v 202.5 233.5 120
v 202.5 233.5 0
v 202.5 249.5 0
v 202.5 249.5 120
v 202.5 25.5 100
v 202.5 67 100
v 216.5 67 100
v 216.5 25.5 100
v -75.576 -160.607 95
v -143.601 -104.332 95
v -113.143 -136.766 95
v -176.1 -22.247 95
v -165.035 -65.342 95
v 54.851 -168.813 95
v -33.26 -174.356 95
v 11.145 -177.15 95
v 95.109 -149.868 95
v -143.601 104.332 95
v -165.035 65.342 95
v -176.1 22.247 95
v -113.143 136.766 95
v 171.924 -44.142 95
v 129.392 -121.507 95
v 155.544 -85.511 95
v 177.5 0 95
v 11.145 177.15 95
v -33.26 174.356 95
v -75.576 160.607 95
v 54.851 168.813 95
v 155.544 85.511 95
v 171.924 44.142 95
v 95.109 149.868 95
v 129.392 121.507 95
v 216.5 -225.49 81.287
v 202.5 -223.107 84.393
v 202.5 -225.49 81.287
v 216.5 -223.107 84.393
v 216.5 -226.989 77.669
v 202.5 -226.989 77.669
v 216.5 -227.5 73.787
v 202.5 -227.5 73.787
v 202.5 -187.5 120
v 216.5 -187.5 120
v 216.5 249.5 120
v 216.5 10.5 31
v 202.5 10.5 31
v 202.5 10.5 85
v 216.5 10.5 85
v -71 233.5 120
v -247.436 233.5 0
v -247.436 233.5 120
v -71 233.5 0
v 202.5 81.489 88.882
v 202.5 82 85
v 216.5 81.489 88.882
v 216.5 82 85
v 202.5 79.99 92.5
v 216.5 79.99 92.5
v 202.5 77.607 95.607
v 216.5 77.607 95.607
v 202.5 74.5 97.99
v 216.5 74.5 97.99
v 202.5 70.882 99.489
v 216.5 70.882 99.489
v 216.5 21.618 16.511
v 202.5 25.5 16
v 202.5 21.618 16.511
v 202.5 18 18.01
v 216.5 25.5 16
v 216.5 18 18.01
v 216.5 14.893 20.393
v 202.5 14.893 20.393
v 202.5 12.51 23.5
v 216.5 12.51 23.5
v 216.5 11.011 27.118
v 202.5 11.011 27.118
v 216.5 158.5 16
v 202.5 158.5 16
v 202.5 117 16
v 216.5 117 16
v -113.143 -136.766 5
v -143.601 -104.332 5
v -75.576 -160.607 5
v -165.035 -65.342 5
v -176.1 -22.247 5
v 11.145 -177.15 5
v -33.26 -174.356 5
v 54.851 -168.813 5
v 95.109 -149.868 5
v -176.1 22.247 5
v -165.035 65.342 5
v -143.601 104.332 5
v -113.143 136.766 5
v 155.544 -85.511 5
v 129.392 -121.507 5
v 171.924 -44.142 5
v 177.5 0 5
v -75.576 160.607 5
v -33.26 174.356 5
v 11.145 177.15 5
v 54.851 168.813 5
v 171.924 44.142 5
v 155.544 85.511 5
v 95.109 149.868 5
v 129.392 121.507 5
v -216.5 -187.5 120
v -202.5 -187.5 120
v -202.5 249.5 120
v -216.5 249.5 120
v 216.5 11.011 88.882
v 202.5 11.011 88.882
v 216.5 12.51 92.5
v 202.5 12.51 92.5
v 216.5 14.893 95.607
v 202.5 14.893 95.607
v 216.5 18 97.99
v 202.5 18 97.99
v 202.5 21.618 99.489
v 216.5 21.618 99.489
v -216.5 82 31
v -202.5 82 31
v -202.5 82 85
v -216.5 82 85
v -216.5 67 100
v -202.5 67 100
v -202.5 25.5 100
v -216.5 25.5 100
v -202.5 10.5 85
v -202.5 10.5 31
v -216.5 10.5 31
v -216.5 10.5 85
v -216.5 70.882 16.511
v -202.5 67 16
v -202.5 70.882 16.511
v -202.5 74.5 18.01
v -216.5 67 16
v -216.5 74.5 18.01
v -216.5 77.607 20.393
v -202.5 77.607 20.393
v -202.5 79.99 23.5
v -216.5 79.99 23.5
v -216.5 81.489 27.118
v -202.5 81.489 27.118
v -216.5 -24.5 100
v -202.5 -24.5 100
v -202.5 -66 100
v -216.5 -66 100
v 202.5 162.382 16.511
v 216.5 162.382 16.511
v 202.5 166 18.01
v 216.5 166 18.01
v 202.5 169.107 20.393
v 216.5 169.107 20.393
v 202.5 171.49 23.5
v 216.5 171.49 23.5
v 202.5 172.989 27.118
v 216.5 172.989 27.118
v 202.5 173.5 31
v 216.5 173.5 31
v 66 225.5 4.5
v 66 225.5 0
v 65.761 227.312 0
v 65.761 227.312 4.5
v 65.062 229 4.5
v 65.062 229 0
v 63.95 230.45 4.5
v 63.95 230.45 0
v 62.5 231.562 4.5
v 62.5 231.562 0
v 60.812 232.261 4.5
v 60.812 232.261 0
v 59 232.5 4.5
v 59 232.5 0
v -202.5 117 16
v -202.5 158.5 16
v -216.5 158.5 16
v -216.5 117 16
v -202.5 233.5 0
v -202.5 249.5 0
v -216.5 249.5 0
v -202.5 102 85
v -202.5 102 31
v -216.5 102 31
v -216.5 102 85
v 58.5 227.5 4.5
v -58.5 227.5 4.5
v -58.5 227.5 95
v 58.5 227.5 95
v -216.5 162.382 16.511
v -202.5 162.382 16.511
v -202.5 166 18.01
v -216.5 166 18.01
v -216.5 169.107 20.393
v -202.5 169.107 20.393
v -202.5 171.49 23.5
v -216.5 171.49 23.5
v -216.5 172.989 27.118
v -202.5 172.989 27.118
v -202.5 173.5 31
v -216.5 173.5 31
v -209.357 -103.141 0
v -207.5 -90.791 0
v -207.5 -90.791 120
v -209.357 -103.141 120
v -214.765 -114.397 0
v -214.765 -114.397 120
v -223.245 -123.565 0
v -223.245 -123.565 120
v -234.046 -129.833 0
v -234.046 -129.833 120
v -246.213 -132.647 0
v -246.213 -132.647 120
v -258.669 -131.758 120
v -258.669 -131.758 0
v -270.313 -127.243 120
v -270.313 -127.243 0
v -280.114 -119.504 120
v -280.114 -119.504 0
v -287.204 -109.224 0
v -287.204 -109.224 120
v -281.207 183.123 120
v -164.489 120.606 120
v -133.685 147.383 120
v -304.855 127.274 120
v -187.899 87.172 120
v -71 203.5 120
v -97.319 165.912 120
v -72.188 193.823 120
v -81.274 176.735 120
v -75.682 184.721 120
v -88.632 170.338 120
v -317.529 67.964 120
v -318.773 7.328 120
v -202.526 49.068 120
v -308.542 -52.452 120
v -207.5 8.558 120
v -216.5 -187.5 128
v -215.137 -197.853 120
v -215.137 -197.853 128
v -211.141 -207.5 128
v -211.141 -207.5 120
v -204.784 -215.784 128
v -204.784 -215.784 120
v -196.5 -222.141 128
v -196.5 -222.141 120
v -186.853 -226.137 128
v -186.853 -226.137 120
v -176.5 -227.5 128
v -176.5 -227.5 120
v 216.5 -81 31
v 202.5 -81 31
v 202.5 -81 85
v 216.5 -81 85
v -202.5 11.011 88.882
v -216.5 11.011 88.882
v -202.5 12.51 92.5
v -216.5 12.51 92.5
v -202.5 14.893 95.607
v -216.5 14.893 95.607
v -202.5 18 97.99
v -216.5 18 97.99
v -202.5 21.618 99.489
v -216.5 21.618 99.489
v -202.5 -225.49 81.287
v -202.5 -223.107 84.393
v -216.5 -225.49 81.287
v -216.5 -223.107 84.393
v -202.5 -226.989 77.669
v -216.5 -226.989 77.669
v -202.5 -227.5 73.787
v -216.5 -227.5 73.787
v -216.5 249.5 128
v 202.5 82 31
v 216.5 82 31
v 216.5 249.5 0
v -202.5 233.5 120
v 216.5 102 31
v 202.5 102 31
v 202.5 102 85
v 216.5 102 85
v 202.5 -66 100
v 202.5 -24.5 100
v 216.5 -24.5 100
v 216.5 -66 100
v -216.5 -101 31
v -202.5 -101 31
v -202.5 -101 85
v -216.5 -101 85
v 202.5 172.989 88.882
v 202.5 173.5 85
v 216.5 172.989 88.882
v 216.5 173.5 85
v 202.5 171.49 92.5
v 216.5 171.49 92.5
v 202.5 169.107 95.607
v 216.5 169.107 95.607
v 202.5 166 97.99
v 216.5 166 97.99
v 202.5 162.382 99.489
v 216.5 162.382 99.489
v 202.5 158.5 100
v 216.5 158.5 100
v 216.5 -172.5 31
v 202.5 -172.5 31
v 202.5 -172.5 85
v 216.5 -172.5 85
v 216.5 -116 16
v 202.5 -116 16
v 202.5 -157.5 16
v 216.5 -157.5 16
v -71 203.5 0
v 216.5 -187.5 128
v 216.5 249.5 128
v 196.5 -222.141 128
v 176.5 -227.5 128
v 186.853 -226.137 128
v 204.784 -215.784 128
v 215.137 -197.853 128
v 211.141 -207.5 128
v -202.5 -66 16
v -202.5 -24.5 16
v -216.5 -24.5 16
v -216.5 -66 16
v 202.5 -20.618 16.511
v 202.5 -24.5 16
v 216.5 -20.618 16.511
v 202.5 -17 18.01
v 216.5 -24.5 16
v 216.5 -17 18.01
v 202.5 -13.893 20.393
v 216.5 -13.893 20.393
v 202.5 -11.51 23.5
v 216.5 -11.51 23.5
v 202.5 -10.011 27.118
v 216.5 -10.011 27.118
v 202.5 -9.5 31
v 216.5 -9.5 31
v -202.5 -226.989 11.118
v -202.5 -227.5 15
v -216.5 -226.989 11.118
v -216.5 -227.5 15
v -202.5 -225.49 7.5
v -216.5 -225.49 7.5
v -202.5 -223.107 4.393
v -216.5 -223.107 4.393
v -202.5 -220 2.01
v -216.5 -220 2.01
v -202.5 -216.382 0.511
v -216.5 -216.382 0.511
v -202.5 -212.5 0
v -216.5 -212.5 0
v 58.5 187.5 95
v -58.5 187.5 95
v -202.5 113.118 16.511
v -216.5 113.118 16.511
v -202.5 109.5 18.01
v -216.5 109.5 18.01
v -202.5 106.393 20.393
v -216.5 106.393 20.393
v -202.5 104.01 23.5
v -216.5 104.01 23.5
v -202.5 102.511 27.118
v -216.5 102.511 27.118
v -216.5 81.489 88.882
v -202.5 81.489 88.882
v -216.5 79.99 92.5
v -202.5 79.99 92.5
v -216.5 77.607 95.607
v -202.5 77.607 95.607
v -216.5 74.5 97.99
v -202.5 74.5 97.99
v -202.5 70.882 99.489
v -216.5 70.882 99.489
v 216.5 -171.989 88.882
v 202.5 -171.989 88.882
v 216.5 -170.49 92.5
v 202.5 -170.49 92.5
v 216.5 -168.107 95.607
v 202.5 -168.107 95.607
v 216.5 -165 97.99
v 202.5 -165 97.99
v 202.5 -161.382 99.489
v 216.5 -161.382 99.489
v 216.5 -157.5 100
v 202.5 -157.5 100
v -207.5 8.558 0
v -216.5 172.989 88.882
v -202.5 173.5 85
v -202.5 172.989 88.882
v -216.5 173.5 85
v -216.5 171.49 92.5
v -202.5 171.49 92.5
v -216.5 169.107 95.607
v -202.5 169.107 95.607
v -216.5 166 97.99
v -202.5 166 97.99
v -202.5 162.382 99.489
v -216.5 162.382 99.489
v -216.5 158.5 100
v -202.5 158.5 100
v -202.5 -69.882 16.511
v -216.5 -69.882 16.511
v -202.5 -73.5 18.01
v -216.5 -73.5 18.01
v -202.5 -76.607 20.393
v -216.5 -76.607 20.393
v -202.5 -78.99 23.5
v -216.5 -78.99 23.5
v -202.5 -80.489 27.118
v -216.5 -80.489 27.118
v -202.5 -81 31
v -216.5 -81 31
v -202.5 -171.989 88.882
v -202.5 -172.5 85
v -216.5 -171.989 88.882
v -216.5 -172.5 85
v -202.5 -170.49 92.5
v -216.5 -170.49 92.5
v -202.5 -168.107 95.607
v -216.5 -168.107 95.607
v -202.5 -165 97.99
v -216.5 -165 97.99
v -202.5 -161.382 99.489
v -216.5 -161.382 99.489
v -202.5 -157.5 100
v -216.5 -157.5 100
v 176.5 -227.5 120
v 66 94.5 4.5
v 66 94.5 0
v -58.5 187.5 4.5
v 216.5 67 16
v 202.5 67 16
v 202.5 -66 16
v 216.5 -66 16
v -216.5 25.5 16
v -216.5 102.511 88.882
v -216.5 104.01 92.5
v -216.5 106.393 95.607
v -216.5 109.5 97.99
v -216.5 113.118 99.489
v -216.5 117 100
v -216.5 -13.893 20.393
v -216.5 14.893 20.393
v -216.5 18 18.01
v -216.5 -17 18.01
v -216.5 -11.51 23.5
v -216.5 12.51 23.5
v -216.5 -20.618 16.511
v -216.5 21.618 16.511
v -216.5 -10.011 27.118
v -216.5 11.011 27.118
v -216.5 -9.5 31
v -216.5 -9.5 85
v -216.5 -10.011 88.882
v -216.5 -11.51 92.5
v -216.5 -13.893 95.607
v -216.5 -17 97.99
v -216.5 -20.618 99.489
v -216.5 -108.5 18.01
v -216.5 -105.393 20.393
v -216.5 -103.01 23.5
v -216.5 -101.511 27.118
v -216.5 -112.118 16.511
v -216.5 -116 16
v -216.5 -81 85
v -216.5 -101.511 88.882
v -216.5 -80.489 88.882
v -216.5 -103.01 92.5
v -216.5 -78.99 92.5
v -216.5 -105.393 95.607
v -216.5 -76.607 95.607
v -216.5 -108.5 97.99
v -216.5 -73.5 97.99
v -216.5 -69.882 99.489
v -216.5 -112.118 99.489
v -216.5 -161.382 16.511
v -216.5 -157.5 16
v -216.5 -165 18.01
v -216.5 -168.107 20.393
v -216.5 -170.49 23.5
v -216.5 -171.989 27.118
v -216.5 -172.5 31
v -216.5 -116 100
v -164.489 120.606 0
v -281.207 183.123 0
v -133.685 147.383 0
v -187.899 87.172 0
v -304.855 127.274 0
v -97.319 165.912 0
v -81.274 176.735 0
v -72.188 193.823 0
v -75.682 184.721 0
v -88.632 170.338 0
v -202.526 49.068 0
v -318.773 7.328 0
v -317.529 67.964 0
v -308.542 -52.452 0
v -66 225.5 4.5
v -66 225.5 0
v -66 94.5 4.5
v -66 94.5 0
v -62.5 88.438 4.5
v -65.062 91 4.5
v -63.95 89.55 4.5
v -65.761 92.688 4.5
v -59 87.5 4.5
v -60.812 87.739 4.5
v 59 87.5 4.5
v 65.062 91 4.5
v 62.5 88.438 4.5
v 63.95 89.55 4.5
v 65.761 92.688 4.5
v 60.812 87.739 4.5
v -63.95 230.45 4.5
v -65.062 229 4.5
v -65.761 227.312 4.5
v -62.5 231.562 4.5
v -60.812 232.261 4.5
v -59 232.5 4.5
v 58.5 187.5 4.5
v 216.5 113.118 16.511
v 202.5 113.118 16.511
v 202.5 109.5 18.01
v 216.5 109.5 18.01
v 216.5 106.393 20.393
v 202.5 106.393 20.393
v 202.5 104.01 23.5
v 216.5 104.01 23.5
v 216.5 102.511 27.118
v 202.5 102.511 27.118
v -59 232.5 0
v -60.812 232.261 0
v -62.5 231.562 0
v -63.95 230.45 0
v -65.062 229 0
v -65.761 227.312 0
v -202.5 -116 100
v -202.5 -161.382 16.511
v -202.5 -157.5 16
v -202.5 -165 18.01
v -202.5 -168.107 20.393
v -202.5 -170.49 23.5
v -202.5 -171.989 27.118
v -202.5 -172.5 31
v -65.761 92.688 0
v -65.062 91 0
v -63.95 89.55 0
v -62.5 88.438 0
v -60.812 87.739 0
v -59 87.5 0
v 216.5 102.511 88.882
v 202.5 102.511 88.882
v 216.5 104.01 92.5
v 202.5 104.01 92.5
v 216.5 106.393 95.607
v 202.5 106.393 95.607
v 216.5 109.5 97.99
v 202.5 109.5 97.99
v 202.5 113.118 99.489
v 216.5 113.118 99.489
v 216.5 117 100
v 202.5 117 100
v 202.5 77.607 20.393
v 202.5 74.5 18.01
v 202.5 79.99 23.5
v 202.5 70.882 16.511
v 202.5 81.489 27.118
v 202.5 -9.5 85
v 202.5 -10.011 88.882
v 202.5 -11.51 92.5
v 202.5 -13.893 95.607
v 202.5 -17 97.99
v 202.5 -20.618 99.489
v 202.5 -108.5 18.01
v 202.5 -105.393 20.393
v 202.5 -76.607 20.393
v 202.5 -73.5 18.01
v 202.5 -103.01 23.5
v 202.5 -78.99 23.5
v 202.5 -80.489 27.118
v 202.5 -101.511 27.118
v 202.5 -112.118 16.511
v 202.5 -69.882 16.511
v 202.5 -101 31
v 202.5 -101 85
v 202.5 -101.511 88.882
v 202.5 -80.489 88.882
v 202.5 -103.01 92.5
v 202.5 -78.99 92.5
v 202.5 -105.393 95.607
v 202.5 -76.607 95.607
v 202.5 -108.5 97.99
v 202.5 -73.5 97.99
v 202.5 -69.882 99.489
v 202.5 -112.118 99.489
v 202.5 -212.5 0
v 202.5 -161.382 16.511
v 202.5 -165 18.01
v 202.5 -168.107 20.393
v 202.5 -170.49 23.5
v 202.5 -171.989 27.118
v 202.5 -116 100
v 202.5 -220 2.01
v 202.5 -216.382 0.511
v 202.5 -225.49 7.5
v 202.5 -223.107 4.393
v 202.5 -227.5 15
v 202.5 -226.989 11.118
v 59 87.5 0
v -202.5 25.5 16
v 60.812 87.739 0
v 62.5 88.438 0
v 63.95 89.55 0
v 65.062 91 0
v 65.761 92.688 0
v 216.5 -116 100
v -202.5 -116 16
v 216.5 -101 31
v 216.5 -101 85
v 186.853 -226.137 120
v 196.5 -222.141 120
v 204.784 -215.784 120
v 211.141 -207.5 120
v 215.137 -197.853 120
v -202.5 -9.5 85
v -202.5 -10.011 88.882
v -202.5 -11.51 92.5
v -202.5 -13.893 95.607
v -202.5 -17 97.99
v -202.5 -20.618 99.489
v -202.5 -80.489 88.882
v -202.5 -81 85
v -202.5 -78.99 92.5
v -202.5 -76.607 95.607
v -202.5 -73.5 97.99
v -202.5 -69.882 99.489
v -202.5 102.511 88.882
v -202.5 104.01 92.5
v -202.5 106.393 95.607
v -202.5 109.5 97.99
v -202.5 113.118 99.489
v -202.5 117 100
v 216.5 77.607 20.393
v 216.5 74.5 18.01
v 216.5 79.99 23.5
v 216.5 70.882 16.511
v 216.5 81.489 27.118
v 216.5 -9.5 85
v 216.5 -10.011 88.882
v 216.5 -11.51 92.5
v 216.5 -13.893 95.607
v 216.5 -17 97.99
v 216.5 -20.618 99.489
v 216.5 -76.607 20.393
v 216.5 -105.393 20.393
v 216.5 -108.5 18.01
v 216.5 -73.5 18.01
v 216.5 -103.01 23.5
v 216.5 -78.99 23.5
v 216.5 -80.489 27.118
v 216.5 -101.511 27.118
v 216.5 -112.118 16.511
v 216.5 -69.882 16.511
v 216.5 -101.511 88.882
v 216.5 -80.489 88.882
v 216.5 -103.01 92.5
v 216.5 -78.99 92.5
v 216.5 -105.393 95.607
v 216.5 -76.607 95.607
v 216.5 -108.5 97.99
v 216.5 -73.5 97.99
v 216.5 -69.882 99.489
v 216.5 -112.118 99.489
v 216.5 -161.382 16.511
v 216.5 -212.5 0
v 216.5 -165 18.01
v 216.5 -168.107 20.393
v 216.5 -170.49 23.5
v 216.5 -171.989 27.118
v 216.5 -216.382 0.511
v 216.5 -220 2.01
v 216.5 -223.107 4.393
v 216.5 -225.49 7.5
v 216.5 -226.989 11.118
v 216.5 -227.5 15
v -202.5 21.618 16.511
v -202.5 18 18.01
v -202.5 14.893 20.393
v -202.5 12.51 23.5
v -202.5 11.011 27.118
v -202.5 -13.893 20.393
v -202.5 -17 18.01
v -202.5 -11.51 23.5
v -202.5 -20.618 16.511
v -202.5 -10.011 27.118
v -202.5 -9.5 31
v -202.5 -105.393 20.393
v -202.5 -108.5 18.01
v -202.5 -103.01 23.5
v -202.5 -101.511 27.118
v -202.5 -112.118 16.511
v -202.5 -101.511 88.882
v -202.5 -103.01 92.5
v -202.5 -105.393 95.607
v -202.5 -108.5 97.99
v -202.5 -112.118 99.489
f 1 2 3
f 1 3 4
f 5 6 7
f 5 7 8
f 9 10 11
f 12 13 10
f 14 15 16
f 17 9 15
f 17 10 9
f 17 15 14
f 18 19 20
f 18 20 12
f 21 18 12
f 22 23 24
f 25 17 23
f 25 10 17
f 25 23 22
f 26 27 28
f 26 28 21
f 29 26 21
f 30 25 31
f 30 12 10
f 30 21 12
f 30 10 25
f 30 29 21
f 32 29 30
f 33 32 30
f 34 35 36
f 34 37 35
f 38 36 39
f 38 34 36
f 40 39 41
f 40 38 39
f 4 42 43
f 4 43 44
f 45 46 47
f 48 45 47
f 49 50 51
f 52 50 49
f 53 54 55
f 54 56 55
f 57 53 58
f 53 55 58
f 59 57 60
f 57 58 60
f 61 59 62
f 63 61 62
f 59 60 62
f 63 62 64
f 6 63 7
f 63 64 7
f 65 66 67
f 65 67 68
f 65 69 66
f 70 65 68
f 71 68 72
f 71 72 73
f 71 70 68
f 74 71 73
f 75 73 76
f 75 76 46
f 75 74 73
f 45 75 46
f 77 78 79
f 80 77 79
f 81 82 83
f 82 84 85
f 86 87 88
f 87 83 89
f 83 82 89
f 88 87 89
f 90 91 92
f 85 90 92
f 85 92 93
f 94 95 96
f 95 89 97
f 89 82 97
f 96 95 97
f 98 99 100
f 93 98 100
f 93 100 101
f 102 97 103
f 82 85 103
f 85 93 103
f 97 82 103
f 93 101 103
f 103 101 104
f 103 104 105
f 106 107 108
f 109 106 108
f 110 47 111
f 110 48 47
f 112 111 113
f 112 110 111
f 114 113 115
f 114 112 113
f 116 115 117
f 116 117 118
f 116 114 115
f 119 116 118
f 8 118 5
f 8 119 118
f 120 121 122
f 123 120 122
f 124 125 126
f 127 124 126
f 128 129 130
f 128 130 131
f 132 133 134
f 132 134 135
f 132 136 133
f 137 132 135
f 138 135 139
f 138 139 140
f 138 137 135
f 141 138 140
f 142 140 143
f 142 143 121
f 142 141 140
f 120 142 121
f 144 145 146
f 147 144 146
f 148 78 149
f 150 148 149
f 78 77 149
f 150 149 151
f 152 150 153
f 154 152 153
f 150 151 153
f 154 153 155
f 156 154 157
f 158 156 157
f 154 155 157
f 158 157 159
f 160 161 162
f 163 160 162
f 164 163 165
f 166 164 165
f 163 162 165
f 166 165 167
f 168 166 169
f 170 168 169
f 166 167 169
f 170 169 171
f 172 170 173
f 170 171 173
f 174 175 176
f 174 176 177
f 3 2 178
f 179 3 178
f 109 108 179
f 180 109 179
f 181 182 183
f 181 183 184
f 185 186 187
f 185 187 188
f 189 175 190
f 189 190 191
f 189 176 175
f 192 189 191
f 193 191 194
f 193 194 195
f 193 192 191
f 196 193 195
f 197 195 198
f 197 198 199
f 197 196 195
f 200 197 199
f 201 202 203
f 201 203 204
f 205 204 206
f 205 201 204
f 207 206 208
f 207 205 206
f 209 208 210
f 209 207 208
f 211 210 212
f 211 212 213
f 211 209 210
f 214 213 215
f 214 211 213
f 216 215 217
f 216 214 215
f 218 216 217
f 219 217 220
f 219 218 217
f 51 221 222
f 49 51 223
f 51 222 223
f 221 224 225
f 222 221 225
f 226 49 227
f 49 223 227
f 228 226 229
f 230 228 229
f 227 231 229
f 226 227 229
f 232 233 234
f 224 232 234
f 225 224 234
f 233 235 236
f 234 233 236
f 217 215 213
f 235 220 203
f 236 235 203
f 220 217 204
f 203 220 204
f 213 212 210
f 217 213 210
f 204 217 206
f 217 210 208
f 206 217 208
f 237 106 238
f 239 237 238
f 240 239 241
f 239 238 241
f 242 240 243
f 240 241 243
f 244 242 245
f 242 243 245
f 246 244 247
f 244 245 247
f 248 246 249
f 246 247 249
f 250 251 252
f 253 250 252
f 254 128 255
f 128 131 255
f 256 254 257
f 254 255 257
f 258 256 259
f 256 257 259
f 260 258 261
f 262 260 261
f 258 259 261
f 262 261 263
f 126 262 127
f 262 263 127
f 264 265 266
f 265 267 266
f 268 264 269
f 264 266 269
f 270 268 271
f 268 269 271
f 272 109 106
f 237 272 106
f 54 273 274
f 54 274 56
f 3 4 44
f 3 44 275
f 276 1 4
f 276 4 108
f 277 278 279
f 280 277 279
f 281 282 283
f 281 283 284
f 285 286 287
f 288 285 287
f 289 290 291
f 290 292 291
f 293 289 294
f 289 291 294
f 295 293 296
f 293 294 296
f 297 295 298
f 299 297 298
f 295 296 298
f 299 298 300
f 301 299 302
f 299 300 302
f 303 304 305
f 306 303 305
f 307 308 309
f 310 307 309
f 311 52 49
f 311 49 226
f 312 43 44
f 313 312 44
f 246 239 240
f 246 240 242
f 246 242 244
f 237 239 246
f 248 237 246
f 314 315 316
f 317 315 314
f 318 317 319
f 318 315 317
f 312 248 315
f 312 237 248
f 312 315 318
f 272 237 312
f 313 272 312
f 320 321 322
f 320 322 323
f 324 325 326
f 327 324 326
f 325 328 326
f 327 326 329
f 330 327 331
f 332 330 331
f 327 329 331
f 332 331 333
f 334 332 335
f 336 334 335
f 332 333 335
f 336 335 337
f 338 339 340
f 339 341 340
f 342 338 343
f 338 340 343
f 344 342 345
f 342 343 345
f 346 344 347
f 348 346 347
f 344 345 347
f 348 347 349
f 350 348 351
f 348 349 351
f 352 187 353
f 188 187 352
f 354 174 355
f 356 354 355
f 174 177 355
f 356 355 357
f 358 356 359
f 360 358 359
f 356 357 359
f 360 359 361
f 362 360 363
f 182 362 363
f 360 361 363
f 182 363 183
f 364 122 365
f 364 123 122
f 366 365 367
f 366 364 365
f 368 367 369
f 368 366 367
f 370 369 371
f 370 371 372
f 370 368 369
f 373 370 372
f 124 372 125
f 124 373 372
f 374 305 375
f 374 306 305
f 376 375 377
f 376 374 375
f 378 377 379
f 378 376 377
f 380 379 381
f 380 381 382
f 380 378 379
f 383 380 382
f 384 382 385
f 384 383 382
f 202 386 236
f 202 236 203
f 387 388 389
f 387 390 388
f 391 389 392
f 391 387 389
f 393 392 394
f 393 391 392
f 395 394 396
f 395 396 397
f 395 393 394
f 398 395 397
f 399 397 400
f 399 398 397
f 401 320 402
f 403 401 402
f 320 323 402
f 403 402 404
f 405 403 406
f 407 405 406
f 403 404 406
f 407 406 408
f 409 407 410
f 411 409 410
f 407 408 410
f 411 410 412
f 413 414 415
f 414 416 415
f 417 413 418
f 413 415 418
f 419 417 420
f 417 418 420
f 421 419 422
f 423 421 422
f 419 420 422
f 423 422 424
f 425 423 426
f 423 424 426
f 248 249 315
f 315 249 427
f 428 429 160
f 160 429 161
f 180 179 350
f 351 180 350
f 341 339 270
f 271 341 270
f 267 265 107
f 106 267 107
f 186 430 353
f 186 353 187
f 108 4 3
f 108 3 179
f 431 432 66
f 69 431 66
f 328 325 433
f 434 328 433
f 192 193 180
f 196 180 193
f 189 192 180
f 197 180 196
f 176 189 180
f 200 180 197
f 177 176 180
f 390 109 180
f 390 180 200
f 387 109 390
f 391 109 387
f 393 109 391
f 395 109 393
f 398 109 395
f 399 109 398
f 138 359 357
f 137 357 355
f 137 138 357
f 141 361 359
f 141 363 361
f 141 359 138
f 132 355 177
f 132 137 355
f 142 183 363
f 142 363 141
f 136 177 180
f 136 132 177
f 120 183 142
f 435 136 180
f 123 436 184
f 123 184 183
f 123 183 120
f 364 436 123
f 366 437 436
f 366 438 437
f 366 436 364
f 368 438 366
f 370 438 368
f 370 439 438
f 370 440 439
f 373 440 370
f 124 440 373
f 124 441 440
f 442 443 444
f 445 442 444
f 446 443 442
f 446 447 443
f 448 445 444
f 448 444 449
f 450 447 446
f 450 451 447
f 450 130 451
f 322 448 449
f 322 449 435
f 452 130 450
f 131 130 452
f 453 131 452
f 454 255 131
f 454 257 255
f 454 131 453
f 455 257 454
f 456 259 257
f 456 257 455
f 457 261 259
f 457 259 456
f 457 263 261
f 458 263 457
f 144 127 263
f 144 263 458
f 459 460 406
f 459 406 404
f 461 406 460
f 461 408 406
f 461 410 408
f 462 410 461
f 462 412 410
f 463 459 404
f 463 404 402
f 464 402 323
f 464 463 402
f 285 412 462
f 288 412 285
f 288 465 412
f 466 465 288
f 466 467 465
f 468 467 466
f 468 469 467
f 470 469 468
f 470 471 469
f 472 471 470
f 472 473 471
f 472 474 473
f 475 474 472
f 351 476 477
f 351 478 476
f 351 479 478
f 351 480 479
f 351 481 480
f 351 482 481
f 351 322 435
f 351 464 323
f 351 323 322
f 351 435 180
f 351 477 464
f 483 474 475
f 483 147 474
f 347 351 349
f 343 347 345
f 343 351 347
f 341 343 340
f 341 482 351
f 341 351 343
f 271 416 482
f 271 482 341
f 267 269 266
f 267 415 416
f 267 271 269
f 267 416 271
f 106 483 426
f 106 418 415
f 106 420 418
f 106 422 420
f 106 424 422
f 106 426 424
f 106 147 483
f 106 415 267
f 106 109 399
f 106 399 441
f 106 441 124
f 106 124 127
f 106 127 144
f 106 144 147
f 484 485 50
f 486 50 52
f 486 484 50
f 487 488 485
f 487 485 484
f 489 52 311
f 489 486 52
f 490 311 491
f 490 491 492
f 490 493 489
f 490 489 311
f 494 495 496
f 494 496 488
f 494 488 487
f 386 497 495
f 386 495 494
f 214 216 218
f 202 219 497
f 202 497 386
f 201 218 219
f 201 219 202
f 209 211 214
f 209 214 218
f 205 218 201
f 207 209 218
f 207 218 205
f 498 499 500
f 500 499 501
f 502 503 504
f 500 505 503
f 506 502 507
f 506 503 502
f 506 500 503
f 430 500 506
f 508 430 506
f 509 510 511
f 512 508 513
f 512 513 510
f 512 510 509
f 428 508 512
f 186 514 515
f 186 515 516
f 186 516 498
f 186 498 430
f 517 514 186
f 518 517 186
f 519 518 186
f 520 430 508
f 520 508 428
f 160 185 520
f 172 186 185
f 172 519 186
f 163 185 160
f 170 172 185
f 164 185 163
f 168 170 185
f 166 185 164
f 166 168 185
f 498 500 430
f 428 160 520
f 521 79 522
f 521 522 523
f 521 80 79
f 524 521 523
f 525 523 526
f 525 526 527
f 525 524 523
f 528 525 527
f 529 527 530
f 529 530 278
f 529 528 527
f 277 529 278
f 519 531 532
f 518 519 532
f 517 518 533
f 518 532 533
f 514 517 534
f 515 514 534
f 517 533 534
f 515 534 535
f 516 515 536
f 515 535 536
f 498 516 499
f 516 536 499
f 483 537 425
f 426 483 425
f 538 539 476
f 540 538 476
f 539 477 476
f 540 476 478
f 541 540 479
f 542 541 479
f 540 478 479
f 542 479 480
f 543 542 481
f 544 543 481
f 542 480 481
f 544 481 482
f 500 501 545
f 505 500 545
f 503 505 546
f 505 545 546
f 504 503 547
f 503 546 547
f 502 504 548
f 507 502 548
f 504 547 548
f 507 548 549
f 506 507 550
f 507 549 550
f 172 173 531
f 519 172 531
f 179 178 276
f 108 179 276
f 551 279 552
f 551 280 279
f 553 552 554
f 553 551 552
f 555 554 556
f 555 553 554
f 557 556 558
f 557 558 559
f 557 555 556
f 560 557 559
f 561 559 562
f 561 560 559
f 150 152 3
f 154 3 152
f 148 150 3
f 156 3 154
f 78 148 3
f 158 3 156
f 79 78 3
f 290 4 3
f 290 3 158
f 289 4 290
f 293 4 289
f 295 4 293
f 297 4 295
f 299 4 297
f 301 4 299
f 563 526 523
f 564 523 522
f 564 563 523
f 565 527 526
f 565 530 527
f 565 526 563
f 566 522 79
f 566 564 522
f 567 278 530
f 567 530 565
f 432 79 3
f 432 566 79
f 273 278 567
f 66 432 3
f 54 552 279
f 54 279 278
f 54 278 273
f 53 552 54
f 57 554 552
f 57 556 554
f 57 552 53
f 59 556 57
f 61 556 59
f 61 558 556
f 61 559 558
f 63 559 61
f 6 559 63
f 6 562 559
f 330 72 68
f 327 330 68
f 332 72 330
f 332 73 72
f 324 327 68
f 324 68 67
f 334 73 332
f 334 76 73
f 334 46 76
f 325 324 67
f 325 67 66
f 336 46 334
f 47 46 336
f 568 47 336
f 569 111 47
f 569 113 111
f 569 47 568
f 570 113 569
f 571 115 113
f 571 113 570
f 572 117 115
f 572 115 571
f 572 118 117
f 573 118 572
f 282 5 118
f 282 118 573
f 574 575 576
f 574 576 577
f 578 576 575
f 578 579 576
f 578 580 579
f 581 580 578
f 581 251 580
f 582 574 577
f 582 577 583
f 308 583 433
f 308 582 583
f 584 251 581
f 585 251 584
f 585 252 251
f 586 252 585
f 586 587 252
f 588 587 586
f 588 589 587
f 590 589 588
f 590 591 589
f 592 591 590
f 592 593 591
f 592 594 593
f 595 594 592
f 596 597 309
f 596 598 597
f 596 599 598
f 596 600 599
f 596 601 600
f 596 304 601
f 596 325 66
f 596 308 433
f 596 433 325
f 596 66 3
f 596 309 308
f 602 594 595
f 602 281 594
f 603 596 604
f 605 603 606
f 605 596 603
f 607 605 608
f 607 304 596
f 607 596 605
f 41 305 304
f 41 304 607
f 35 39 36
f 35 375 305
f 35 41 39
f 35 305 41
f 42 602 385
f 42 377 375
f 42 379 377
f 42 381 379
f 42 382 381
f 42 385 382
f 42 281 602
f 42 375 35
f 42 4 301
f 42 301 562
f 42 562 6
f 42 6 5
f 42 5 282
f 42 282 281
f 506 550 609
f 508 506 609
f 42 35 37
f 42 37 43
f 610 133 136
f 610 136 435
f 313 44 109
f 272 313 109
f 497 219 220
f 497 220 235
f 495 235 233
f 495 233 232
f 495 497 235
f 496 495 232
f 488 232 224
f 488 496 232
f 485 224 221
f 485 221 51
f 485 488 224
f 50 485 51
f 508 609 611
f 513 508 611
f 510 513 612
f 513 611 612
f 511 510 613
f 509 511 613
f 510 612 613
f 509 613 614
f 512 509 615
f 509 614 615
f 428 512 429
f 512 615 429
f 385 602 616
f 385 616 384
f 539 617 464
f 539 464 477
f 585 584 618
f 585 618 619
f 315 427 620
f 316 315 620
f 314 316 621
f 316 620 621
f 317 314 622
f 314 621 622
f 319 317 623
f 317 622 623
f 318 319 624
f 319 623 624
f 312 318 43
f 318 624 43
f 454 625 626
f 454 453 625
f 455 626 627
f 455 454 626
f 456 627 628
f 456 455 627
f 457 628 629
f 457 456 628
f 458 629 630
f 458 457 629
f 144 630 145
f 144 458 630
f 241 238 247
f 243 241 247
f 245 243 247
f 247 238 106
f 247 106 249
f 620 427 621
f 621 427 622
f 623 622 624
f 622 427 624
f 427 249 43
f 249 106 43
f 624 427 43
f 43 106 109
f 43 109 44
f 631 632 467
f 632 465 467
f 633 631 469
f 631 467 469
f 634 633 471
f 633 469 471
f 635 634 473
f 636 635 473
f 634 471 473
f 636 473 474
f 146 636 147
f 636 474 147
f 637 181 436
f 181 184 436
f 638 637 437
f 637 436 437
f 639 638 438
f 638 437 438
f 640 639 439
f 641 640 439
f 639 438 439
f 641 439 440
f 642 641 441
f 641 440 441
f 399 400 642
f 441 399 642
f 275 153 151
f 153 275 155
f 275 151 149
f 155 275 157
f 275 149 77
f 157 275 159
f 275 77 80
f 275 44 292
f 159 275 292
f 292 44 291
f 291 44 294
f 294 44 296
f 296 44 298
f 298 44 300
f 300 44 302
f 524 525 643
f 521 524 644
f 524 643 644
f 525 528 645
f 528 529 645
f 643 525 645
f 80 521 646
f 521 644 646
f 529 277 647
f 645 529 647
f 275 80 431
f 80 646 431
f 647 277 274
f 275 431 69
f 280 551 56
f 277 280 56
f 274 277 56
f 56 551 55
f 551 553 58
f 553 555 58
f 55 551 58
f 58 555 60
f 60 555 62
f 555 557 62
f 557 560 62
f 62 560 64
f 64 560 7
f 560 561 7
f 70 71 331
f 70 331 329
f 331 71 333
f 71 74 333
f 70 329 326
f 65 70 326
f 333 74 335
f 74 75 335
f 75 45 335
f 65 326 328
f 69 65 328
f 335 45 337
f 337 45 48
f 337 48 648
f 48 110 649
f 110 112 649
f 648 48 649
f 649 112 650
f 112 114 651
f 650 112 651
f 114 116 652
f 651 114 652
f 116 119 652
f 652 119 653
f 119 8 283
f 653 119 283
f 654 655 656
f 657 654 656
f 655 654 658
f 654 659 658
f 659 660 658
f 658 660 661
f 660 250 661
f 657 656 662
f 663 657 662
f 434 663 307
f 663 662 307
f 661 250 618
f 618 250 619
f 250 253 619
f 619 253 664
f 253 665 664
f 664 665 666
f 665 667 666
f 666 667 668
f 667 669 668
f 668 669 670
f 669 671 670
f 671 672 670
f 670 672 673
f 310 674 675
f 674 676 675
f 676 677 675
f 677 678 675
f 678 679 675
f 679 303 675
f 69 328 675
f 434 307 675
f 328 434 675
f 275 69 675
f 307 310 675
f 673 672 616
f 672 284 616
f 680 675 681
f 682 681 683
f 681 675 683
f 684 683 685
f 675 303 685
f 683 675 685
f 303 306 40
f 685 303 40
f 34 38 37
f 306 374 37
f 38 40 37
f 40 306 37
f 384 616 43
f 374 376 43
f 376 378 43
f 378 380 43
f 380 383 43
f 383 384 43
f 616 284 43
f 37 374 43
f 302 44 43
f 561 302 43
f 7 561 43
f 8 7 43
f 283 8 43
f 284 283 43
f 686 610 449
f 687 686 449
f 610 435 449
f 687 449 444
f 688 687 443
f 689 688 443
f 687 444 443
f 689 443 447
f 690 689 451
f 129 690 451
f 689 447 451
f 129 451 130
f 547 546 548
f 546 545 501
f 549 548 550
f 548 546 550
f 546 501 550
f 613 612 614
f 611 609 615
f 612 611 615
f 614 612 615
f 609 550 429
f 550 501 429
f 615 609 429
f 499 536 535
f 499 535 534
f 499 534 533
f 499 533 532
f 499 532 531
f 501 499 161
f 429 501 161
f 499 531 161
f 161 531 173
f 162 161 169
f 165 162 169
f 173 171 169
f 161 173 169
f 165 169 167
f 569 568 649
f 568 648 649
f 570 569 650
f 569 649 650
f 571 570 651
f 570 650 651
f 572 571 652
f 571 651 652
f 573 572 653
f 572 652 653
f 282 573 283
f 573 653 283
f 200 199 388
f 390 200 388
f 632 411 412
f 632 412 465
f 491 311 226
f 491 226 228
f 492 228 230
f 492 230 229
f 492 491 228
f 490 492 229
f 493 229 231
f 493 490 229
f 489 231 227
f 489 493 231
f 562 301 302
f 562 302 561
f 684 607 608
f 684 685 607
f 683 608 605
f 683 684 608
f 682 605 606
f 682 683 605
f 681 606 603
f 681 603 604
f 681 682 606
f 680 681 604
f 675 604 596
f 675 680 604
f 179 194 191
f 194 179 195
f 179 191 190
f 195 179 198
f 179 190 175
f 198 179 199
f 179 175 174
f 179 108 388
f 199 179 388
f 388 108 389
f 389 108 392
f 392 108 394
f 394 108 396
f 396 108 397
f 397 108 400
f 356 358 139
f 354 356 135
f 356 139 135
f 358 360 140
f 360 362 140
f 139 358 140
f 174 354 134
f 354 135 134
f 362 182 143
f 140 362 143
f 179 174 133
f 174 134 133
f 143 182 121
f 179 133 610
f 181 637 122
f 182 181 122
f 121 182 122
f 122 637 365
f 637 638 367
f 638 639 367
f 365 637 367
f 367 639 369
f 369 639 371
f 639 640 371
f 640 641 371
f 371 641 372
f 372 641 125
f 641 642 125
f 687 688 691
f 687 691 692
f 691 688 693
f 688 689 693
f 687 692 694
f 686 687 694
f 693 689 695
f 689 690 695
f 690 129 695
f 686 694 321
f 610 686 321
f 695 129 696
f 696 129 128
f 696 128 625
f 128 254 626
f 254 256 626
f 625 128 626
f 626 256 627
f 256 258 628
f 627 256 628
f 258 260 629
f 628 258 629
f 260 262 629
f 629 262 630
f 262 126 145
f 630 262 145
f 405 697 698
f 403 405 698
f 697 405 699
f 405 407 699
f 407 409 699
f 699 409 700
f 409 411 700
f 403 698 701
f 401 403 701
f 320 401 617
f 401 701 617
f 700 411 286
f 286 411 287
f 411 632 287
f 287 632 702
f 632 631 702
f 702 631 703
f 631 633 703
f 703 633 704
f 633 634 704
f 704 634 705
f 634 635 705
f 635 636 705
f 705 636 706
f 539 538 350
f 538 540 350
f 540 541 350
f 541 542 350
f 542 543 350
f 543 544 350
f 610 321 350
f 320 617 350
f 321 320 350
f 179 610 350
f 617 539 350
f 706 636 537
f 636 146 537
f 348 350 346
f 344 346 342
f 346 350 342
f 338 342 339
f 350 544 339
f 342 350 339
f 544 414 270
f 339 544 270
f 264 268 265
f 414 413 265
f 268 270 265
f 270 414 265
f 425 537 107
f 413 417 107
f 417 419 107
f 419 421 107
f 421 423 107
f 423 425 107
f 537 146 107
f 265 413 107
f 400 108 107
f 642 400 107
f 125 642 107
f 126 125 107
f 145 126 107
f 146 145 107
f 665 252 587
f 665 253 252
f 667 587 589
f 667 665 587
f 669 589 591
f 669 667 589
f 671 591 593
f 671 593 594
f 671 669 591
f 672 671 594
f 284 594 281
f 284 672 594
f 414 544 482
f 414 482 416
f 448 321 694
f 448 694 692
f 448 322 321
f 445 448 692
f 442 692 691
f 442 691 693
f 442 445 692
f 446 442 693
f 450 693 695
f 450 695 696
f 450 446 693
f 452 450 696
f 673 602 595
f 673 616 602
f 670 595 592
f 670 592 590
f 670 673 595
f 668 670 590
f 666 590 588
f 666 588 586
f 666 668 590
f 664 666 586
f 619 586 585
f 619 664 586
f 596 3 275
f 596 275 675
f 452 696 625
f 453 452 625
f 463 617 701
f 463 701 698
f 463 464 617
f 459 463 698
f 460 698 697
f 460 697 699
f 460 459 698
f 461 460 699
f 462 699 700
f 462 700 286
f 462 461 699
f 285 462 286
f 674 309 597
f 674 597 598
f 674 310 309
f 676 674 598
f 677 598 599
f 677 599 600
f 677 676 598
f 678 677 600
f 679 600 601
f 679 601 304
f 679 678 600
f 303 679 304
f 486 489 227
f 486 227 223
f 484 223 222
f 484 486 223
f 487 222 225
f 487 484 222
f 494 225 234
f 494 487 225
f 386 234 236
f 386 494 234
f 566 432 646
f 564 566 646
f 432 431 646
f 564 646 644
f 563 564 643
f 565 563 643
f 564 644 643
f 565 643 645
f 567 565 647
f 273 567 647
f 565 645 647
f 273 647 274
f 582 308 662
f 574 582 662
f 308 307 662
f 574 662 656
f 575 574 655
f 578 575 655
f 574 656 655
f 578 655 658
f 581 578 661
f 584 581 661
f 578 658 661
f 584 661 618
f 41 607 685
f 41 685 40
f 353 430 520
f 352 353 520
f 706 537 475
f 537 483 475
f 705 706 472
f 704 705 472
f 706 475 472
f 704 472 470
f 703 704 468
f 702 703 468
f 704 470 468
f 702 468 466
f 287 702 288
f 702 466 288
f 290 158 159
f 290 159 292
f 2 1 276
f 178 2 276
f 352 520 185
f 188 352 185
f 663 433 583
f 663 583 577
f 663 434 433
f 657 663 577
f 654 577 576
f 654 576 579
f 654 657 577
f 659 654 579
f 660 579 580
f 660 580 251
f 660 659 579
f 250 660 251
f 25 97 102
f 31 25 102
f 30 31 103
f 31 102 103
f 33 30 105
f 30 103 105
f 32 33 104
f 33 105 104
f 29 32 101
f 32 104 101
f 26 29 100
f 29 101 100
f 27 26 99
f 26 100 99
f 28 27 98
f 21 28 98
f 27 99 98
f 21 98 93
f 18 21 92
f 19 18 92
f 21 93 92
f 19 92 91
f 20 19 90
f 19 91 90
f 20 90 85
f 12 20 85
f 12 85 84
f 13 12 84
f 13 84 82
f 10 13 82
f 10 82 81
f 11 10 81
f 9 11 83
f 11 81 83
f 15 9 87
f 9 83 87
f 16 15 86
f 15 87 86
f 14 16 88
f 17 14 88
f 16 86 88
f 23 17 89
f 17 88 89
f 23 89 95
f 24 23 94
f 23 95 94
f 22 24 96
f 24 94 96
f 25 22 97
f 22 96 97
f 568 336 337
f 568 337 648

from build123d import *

# Parameters (mm, degrees)
F2_R          = 177.5
F3_DEPTH      = 90
F4_W          = 117
F4_H          = 40
F5_DEPTH      = 5
F5_DEPTH_BACK = 90
F7_DEPTH      = 4.5
F10_W         = 202.5
F10_H         = 120
F11_DEPTH     = 16
F14_W         = 71.5
F14_H         = 84
F15_DEPTH     = 14
F17_R         = 15
F22_DEPTH     = 8
F24_DEPTH     = 120


# Not quite as in the source:
# - a feature names something its author has since deleted; it is built from what else it names


with BuildPart() as f3:
    # F2 (on plane+point) → F3 (new body)
    with BuildSketch(Plane.XY.offset(5)):
        Circle(F2_R)
    extrude(amount=F3_DEPTH)


with BuildPart() as f5:
    # F4 (on plane+point) → F5 (new body, two sides)
    with BuildSketch(Plane.XY.offset(5)) as f5_sk:
        with Locations((0, 207.5)):
            Rectangle(F4_W, F4_H)
    extrude(amount=-F5_DEPTH)
    extrude(f5_sk.sketch, amount=F5_DEPTH_BACK)

    # F6 (on Top) → F7 (join)
    with BuildSketch(Plane.XY):
        with BuildLine():
            Line((59, 232.5), (-59, 232.5))
            ThreePointArc((-59, 232.5), (-63.9497474683, 230.4497474683), (-66, 225.5))
            Line((-66, 225.5), (-66, 94.5))
            ThreePointArc((-66, 94.5), (-63.9497474683, 89.5502525317), (-59, 87.5))
            Line((-59, 87.5), (59, 87.5))
            ThreePointArc((59, 87.5), (63.9497474683, 89.5502525317), (66, 94.5))
            Line((66, 94.5), (66, 225.5))
            ThreePointArc((66, 225.5), (63.9497474683, 230.4497474683), (59, 232.5))
        make_face()
    extrude(amount=F7_DEPTH)


with BuildPart() as f11:
    # F10 (on plane+point) → F11 (new body)
    with BuildSketch(Plane.XZ.offset(-233.5)):
        with Locations((-101.25, 60)):
            Rectangle(F10_W, F10_H)
    extrude(amount=-F11_DEPTH)


with BuildPart() as f15:
    # F14 (on face) → F15 (new body)
    with BuildSketch(Plane(origin=(-202.5, 0, 0), x_dir=(0, -1, 0), z_dir=(-1, 0, 0))):
        Polygon((187.5, 120), (-249.5, 120), (-249.5, 0), (227.5, 0), (227.5, 80), align=None)
        with Locations((-137.75, 58)):
            Rectangle(F14_W, F14_H, mode=Mode.SUBTRACT)
        with Locations((-46.25, 58)):
            Rectangle(F14_W, F14_H, mode=Mode.SUBTRACT)
        with Locations((45.25, 58)):
            Rectangle(F14_W, F14_H, mode=Mode.SUBTRACT)
        with Locations((136.75, 58)):
            Rectangle(F14_W, F14_H, mode=Mode.SUBTRACT)
    extrude(amount=F15_DEPTH)

    # F17
    f17_edges = [f15.edges().sort_by_distance(p)[0] for p in [
        (-209.5, 82, 100),
        (-209.5, 173.5, 100),
        (-209.5, -227.5, 0),
        (-209.5, -227.5, 80),
        (-209.5, 173.5, 16),
        (-209.5, 10.5, 16),
        (-209.5, 102, 16),
        (-209.5, 102, 100),
        (-209.5, -101, 16),
        (-209.5, -172.5, 16),
        (-209.5, -172.5, 100),
        (-209.5, -101, 100),
        (-209.5, -9.5, 16),
        (-209.5, -9.5, 100),
        (-209.5, -81, 16),
        (-209.5, -81, 100),
        (-209.5, 10.5, 100),
        (-209.5, 82, 16),
    ]]
    fillet(f17_edges, radius=F17_R)


with BuildPart() as f18_1:
    # F18: instance of F11
    add(f11.part.mirror(Plane.YZ))


with BuildPart() as f19_1:
    # F19: instance of F15
    add(f15.part.mirror(Plane.YZ))


with BuildPart() as f22:
    # F21 (on plane+point) → F22 (new body)
    with BuildSketch(Plane.XY.offset(120)):
        with BuildLine():
            Line((216.5, -187.5), (216.5, 249.5))
            Line((216.5, 249.5), (-216.5, 249.5))
            Line((-216.5, 249.5), (-216.5, -187.5))
            ThreePointArc((-216.5, -187.5), (-204.7842712475, -215.7842712475), (-176.5, -227.5))
            Line((-176.5, -227.5), (176.5, -227.5))
            ThreePointArc((176.5, -227.5), (204.7842712475, -215.7842712475), (216.5, -187.5))
        make_face()
    extrude(amount=F22_DEPTH)


with BuildPart() as f11_1:
    add(f11.part)

    # F23: union F18_1
    add(f18_1.part)


with BuildPart() as f24:
    # F12 (on face) → F24 (new body, through all)
    with BuildSketch(Plane(origin=(0, 0, 0), x_dir=(1, 0, 0), z_dir=(0, 0, -1))):
        with BuildLine():
            ThreePointArc((-287.2044828435, 109.2236505243), (-317.5294909897, -67.9642915883), (-247.435966397, -233.5))
            Line((-247.435966397, -233.5), (-202.5, -233.5))
            Line((-202.5, -233.5), (-71, -233.5))
            Line((-71, -233.5), (-71, -203.5))
            ThreePointArc((-71, -203.5), (-78.2339182284, -180.556942546), (-97.319194267, -165.9122951686))
            ThreePointArc((-97.319194267, -165.9122951686), (-177.2164384695, -104.6049834268), (-207.5, -8.5577970797))
            Line((-207.5, -8.5577970797), (-207.5, 90.791272666))
            ThreePointArc((-207.5, 90.791272666), (-240.0241445264, 131.6952979534), (-287.2044828435, 109.2236505243))
        make_face()
    extrude(amount=-F24_DEPTH)


solid = Compound([f3.part, f5.part, f15.part, f19_1.part, f22.part, f11_1.part, f24.part])
